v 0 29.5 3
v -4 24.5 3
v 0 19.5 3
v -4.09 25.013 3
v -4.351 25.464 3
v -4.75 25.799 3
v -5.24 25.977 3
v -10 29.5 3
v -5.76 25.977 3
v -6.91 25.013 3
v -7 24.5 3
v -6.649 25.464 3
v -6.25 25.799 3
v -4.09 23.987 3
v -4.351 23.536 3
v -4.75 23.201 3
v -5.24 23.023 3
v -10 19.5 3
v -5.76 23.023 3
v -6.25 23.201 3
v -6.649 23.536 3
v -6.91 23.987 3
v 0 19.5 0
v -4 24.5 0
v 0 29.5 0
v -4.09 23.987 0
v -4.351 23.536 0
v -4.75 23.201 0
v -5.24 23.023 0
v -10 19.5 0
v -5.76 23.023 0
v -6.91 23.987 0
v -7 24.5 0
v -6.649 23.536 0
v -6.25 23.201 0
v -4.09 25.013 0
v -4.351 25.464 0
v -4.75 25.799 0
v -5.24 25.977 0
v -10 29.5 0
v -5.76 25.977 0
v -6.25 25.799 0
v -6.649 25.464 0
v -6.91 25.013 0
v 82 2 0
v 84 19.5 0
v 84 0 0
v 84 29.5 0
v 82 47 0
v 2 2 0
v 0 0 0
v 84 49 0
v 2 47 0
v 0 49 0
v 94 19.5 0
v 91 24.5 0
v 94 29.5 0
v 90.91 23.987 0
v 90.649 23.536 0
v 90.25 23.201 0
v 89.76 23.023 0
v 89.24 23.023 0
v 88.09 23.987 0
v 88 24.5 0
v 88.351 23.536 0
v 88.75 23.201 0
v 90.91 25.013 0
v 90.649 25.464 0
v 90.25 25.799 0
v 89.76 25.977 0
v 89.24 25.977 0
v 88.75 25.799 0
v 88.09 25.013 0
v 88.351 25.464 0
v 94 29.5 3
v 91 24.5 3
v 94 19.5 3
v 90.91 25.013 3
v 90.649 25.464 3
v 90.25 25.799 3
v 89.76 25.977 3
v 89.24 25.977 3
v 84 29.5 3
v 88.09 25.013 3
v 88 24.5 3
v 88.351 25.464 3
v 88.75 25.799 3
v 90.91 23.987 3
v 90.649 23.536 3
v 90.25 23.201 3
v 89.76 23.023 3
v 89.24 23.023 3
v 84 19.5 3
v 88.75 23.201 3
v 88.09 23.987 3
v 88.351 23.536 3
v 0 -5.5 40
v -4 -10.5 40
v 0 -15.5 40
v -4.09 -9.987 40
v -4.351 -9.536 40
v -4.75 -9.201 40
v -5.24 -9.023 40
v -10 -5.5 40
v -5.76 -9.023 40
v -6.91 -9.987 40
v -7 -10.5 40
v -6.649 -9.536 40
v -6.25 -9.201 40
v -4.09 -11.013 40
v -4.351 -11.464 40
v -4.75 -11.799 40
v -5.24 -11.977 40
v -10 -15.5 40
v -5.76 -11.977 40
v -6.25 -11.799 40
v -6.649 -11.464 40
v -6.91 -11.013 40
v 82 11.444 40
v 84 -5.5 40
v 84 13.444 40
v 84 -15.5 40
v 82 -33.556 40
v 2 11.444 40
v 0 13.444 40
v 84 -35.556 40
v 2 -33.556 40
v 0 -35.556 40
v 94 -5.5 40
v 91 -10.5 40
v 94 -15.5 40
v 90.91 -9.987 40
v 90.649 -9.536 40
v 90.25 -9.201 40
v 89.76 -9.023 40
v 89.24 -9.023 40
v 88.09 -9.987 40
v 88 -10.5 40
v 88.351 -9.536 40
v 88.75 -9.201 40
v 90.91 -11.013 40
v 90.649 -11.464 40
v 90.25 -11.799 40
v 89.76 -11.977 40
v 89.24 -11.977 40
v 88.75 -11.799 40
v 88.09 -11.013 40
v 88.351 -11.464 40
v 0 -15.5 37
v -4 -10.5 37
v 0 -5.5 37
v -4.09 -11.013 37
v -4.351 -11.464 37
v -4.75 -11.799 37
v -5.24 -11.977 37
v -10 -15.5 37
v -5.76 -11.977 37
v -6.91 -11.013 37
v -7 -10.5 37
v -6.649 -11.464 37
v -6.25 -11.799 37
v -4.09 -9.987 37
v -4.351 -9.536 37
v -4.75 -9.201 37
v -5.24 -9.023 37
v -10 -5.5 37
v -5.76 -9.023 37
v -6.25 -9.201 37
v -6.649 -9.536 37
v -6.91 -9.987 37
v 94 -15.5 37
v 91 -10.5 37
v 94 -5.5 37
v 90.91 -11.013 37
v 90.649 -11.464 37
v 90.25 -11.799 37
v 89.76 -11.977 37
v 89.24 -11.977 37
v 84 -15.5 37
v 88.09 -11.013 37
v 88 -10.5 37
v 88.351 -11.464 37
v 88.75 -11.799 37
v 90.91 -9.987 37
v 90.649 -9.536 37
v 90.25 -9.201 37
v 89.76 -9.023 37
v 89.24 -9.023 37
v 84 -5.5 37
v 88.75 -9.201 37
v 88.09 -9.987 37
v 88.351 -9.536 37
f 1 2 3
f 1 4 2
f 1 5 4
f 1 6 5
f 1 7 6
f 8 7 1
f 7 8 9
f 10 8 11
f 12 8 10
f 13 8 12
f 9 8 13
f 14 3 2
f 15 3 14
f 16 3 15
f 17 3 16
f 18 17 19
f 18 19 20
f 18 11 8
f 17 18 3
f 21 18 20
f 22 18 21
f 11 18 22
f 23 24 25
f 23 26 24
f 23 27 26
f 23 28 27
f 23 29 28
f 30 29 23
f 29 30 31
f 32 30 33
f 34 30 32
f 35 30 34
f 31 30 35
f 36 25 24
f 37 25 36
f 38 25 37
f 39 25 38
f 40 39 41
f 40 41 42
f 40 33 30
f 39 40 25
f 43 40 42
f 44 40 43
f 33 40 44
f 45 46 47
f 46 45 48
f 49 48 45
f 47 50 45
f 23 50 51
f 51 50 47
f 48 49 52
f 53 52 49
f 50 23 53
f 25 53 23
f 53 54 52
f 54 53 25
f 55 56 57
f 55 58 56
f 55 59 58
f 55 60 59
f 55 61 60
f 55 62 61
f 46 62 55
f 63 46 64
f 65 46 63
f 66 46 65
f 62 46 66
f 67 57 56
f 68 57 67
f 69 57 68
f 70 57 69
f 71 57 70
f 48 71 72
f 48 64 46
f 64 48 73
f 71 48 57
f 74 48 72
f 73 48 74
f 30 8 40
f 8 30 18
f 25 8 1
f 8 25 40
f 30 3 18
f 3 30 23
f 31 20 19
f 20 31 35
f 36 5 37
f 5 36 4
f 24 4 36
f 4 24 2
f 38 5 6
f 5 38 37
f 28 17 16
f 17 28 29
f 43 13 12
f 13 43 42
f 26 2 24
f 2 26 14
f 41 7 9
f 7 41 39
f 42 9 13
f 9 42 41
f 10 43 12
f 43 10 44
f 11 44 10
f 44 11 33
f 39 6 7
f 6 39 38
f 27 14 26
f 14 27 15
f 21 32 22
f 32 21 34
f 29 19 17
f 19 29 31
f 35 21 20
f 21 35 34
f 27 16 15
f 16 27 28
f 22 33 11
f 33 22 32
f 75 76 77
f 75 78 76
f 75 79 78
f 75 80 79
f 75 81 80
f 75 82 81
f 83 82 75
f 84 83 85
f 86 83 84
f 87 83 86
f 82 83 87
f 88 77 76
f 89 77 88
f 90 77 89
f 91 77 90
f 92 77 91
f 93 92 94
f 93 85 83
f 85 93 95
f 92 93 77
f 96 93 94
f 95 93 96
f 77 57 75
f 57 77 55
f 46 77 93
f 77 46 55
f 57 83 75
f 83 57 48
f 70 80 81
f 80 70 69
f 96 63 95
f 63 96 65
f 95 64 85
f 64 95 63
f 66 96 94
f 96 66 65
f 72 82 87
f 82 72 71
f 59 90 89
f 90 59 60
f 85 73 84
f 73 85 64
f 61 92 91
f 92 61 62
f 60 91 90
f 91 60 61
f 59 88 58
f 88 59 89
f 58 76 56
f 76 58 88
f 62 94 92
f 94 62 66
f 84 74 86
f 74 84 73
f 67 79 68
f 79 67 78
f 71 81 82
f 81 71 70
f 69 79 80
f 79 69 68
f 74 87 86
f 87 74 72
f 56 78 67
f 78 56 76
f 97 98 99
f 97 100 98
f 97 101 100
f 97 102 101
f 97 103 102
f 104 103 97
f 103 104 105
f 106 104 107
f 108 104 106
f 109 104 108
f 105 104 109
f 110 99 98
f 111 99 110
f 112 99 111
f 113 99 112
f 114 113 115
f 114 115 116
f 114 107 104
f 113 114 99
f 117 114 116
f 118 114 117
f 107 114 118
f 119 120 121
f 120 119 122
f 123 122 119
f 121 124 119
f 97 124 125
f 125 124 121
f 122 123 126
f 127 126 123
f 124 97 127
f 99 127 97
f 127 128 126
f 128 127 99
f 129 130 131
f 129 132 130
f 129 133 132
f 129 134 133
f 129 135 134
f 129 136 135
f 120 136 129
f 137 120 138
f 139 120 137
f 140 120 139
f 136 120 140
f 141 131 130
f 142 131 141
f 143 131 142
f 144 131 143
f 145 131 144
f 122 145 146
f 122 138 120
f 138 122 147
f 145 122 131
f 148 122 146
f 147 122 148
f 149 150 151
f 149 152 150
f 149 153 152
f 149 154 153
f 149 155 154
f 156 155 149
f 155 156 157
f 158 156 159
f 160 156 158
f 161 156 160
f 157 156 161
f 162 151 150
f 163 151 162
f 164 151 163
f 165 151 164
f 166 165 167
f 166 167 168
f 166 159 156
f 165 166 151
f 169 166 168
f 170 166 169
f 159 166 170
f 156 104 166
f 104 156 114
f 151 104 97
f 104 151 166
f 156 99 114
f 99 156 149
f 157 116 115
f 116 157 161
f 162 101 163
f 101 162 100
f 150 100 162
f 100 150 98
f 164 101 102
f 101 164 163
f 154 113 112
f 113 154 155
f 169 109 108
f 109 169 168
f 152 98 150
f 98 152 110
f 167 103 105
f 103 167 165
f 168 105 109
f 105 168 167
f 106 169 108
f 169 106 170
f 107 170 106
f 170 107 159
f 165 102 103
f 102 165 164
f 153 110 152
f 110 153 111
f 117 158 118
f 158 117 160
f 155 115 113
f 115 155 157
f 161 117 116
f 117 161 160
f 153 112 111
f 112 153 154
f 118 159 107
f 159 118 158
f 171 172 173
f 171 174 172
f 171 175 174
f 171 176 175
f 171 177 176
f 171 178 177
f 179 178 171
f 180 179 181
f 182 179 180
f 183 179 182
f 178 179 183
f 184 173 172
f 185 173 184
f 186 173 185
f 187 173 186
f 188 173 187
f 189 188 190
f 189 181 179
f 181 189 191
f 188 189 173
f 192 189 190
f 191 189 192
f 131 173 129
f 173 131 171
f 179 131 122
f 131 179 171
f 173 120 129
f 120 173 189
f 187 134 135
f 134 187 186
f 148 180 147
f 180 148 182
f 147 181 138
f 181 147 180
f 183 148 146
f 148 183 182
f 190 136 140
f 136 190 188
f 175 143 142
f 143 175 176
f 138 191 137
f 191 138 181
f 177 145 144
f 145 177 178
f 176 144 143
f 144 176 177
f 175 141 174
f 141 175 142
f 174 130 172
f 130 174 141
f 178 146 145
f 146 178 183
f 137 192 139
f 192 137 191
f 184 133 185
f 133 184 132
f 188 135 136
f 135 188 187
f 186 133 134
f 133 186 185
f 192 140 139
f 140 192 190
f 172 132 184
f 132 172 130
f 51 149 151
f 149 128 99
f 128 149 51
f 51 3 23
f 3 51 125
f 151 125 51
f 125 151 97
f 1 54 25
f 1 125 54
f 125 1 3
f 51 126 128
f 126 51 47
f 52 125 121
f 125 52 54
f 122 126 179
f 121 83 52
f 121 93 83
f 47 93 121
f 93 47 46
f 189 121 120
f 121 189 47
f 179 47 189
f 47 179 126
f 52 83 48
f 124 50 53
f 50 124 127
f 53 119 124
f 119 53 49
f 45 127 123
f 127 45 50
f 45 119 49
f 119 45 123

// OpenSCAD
//General
$fn = 18;
tolerance = 0.5;
wall = 2;
r_m3 = 3/2;

w_chute_inner = 80;
depth_chute_inner = 45;
h_chute_inner = 10;

// left side slot cutout
h_chute_inner_slot = 4;
depth_chute_inner_slot = 18;

// side wall
depth_chute_side_wall = depth_chute_inner+wall*2;
h_chute_side_wall = 32;

// main wall
h_chute_main_wall = h_chute_side_wall;

difference(){
  // chuteBody();
  // translate([-0.001,wall-0.001+6,wall*5])
  // cube([w_chute_inner*2, depth_chute_inner-10, h_chute_side_wall*2]);
  // translate([7,depth_chute_inner,h_chute_inner])
  // cube([w_chute_inner-10, wall*3, h_chute_main_wall+0.001]);
}
// mirror([0,0,1])
chuteTunnel();
// chuteConnector();

module chuteBody(){
  // main body
  difference(){
    union(){
      // main body
      cube([w_chute_inner+wall*2, depth_chute_inner+wall*2, h_chute_inner]);
      // right nut bracket
      translate([0,(depth_chute_inner+wall*2)/2,0])
      nutBracket(l=20);
      // left nut bracket
      translate([w_chute_inner+wall*2,(depth_chute_inner+wall*2)/2,0])
      rotate([0,0,180])
      nutBracket(l=20);
    }
    // hollow out
    translate([wall,wall,-0.5])
    cube([w_chute_inner, depth_chute_inner, h_chute_inner+1]);
    // slot on left side
    translate([w_chute_inner,wall,h_chute_inner-h_chute_inner_slot])
    cube([wall*3, depth_chute_inner_slot, h_chute_inner_slot+0.001]);
  }
  // side wall
  translate([0,wall,h_chute_inner])
  cube([wall, depth_chute_side_wall-wall, h_chute_side_wall]);
  // main wall
  color("blue")
  translate([0,depth_chute_inner+wall,h_chute_inner])
  cube([w_chute_inner+wall*2, wall, h_chute_main_wall]);
  // left side wall
  translate([w_chute_inner+wall*2,wall+depth_chute_inner_slot,h_chute_inner])
  rotate([0,-90,0])
  linear_extrude(height=wall)
  polygon([
    [0,0],
    [0,h_chute_side_wall-wall*2],
    [h_chute_side_wall,h_chute_side_wall-wall*2],
    [h_chute_side_wall,6],
  ]);
}

module chuteConnector(){
  x_connector = 49;
  w_connector = 6;
  w_connector_space = 3;
  depth_connector = 10;
  h_connector = h_chute_inner+h_chute_side_wall;
  step_connector = h_connector/10;
  h_arm_head = step_connector*4;
  w_arm_head = w_connector_space-tolerance;
  depth_arm_head = depth_connector-tolerance;
  h_arm = 39;
  w_arm_leg = 10;
  x_arm_leg_hole = w_arm_leg/2+1;

  // Connector for metal bracket and chute body
  translate([x_connector, depth_chute_inner+depth_connector/2+wall*2,h_connector/2]){
    difference(){
      cube([w_connector,depth_connector,h_connector], center=true);
      cube([w_connector_space+0.001,depth_connector+0.001,h_chute_inner+h_chute_side_wall+0.001], center=true);
      translate([0,0,-h_connector/4.125])
      for(i=[0:step_connector:h_connector/2]){
        translate([0,0,i])
        rotate([0,90,0])
        cylinder(r=r_m3, h=w_connector+0.001, center=true);
      }
    }
  }
  //arm
  // translate([x_connector, depth_chute_inner+depth_connector/2+wall*2,h_connector/2])
  // translate([(-w_connector_space+tolerance)/2,(-depth_connector+tolerance)/2,-w_connector+h_arm_head])
  // mirror([0,0,1])
  // difference(){
  //   cube([w_arm_head,depth_arm_head,h_arm_head*2]);
  //   translate([0,depth_arm_head/2,h_arm_head/2])
  //   rotate([0,90,0])
  //   cylinder(r=r_m3,h=w_connector+0.001, center=true);
  // }
  // translate([
  //   x_connector+(-w_connector_space+tolerance)/2,
  //   (-depth_connector+tolerance)/2+depth_chute_inner+depth_connector/2+wall*2,
  //   0
  // ]){
  //   mirror([0,0,1])
  //   cube([w_arm_head,depth_arm_head,h_arm]);
  //   translate([0,0,-h_arm])
  //   difference(){
  //     cube([w_arm_leg,w_arm_leg-tolerance,wall]);
  //     color("red")
  //     translate([x_arm_leg_hole,depth_arm_head/2,0])
  //     cylinder(r=r_m3, h=w_connector+0.001, center=true);
  //   }
  // }
}

module chuteTunnel(){
  h_chute_tunnel = 40;
  angle_chute_tunnel = 40;
  depth_tunnel_L1 = depth_chute_inner;
  difference(){
    union(){
      // main tunnel body
      skew([0, 0, 0, 0, -angle_chute_tunnel, 0])
      cube([w_chute_inner+wall*2, depth_tunnel_L1+wall*2, h_chute_tunnel]);
      // right nut bracket -- top
      translate([0,(depth_chute_inner+wall*2)/2,0])
      nutBracket(l=20);
      // left nut bracket -- top
      translate([w_chute_inner+wall*2,(depth_chute_inner+wall*2)/2,0])
      rotate([0,0,180])
      nutBracket(l=20);
      translate([0,-35,h_chute_tunnel-3]){
        // right nut bracket -- bottom
        translate([0,(depth_chute_inner+wall*2)/2,0])
        nutBracket(l=20);
        // left nut bracket -- bottom
        translate([w_chute_inner+wall*2,(depth_chute_inner+wall*2)/2,0])
        rotate([0,0,180])
        nutBracket(l=20);
      }
    }
    skew([0, 0, 0, 0, -angle_chute_tunnel, 0])
    translate([wall,wall,-0.5])
    cube([w_chute_inner, depth_tunnel_L1, h_chute_tunnel+1]);
  }
}

/*skew takes an array of six angles:
 *x along y
 *x along z
 *y along x
 *y along z
 *z along x
 *z along y
 */
module skew(dims) {
matrix = [
  [ 1, dims[0]/45, dims[1]/45, 0 ],
  [ dims[2]/45, 1, dims[4]/45, 0 ],
  [ dims[5]/45, dims[3]/45, 1, 0 ],
  [ 0, 0, 0, 1 ]
];
multmatrix(matrix)
  children();
}

module nutBracket(l=10){
  h = 3;
  w = 10;
  offset_m3 = r_m3*2;
  translate([0,0,h/2])
  difference(){
    cube([l,w,h], center=true);
    translate([-l/2+r_m3+offset_m3,0,0])
    cylinder(r=r_m3, h=h*2, center=true);
  }
}
